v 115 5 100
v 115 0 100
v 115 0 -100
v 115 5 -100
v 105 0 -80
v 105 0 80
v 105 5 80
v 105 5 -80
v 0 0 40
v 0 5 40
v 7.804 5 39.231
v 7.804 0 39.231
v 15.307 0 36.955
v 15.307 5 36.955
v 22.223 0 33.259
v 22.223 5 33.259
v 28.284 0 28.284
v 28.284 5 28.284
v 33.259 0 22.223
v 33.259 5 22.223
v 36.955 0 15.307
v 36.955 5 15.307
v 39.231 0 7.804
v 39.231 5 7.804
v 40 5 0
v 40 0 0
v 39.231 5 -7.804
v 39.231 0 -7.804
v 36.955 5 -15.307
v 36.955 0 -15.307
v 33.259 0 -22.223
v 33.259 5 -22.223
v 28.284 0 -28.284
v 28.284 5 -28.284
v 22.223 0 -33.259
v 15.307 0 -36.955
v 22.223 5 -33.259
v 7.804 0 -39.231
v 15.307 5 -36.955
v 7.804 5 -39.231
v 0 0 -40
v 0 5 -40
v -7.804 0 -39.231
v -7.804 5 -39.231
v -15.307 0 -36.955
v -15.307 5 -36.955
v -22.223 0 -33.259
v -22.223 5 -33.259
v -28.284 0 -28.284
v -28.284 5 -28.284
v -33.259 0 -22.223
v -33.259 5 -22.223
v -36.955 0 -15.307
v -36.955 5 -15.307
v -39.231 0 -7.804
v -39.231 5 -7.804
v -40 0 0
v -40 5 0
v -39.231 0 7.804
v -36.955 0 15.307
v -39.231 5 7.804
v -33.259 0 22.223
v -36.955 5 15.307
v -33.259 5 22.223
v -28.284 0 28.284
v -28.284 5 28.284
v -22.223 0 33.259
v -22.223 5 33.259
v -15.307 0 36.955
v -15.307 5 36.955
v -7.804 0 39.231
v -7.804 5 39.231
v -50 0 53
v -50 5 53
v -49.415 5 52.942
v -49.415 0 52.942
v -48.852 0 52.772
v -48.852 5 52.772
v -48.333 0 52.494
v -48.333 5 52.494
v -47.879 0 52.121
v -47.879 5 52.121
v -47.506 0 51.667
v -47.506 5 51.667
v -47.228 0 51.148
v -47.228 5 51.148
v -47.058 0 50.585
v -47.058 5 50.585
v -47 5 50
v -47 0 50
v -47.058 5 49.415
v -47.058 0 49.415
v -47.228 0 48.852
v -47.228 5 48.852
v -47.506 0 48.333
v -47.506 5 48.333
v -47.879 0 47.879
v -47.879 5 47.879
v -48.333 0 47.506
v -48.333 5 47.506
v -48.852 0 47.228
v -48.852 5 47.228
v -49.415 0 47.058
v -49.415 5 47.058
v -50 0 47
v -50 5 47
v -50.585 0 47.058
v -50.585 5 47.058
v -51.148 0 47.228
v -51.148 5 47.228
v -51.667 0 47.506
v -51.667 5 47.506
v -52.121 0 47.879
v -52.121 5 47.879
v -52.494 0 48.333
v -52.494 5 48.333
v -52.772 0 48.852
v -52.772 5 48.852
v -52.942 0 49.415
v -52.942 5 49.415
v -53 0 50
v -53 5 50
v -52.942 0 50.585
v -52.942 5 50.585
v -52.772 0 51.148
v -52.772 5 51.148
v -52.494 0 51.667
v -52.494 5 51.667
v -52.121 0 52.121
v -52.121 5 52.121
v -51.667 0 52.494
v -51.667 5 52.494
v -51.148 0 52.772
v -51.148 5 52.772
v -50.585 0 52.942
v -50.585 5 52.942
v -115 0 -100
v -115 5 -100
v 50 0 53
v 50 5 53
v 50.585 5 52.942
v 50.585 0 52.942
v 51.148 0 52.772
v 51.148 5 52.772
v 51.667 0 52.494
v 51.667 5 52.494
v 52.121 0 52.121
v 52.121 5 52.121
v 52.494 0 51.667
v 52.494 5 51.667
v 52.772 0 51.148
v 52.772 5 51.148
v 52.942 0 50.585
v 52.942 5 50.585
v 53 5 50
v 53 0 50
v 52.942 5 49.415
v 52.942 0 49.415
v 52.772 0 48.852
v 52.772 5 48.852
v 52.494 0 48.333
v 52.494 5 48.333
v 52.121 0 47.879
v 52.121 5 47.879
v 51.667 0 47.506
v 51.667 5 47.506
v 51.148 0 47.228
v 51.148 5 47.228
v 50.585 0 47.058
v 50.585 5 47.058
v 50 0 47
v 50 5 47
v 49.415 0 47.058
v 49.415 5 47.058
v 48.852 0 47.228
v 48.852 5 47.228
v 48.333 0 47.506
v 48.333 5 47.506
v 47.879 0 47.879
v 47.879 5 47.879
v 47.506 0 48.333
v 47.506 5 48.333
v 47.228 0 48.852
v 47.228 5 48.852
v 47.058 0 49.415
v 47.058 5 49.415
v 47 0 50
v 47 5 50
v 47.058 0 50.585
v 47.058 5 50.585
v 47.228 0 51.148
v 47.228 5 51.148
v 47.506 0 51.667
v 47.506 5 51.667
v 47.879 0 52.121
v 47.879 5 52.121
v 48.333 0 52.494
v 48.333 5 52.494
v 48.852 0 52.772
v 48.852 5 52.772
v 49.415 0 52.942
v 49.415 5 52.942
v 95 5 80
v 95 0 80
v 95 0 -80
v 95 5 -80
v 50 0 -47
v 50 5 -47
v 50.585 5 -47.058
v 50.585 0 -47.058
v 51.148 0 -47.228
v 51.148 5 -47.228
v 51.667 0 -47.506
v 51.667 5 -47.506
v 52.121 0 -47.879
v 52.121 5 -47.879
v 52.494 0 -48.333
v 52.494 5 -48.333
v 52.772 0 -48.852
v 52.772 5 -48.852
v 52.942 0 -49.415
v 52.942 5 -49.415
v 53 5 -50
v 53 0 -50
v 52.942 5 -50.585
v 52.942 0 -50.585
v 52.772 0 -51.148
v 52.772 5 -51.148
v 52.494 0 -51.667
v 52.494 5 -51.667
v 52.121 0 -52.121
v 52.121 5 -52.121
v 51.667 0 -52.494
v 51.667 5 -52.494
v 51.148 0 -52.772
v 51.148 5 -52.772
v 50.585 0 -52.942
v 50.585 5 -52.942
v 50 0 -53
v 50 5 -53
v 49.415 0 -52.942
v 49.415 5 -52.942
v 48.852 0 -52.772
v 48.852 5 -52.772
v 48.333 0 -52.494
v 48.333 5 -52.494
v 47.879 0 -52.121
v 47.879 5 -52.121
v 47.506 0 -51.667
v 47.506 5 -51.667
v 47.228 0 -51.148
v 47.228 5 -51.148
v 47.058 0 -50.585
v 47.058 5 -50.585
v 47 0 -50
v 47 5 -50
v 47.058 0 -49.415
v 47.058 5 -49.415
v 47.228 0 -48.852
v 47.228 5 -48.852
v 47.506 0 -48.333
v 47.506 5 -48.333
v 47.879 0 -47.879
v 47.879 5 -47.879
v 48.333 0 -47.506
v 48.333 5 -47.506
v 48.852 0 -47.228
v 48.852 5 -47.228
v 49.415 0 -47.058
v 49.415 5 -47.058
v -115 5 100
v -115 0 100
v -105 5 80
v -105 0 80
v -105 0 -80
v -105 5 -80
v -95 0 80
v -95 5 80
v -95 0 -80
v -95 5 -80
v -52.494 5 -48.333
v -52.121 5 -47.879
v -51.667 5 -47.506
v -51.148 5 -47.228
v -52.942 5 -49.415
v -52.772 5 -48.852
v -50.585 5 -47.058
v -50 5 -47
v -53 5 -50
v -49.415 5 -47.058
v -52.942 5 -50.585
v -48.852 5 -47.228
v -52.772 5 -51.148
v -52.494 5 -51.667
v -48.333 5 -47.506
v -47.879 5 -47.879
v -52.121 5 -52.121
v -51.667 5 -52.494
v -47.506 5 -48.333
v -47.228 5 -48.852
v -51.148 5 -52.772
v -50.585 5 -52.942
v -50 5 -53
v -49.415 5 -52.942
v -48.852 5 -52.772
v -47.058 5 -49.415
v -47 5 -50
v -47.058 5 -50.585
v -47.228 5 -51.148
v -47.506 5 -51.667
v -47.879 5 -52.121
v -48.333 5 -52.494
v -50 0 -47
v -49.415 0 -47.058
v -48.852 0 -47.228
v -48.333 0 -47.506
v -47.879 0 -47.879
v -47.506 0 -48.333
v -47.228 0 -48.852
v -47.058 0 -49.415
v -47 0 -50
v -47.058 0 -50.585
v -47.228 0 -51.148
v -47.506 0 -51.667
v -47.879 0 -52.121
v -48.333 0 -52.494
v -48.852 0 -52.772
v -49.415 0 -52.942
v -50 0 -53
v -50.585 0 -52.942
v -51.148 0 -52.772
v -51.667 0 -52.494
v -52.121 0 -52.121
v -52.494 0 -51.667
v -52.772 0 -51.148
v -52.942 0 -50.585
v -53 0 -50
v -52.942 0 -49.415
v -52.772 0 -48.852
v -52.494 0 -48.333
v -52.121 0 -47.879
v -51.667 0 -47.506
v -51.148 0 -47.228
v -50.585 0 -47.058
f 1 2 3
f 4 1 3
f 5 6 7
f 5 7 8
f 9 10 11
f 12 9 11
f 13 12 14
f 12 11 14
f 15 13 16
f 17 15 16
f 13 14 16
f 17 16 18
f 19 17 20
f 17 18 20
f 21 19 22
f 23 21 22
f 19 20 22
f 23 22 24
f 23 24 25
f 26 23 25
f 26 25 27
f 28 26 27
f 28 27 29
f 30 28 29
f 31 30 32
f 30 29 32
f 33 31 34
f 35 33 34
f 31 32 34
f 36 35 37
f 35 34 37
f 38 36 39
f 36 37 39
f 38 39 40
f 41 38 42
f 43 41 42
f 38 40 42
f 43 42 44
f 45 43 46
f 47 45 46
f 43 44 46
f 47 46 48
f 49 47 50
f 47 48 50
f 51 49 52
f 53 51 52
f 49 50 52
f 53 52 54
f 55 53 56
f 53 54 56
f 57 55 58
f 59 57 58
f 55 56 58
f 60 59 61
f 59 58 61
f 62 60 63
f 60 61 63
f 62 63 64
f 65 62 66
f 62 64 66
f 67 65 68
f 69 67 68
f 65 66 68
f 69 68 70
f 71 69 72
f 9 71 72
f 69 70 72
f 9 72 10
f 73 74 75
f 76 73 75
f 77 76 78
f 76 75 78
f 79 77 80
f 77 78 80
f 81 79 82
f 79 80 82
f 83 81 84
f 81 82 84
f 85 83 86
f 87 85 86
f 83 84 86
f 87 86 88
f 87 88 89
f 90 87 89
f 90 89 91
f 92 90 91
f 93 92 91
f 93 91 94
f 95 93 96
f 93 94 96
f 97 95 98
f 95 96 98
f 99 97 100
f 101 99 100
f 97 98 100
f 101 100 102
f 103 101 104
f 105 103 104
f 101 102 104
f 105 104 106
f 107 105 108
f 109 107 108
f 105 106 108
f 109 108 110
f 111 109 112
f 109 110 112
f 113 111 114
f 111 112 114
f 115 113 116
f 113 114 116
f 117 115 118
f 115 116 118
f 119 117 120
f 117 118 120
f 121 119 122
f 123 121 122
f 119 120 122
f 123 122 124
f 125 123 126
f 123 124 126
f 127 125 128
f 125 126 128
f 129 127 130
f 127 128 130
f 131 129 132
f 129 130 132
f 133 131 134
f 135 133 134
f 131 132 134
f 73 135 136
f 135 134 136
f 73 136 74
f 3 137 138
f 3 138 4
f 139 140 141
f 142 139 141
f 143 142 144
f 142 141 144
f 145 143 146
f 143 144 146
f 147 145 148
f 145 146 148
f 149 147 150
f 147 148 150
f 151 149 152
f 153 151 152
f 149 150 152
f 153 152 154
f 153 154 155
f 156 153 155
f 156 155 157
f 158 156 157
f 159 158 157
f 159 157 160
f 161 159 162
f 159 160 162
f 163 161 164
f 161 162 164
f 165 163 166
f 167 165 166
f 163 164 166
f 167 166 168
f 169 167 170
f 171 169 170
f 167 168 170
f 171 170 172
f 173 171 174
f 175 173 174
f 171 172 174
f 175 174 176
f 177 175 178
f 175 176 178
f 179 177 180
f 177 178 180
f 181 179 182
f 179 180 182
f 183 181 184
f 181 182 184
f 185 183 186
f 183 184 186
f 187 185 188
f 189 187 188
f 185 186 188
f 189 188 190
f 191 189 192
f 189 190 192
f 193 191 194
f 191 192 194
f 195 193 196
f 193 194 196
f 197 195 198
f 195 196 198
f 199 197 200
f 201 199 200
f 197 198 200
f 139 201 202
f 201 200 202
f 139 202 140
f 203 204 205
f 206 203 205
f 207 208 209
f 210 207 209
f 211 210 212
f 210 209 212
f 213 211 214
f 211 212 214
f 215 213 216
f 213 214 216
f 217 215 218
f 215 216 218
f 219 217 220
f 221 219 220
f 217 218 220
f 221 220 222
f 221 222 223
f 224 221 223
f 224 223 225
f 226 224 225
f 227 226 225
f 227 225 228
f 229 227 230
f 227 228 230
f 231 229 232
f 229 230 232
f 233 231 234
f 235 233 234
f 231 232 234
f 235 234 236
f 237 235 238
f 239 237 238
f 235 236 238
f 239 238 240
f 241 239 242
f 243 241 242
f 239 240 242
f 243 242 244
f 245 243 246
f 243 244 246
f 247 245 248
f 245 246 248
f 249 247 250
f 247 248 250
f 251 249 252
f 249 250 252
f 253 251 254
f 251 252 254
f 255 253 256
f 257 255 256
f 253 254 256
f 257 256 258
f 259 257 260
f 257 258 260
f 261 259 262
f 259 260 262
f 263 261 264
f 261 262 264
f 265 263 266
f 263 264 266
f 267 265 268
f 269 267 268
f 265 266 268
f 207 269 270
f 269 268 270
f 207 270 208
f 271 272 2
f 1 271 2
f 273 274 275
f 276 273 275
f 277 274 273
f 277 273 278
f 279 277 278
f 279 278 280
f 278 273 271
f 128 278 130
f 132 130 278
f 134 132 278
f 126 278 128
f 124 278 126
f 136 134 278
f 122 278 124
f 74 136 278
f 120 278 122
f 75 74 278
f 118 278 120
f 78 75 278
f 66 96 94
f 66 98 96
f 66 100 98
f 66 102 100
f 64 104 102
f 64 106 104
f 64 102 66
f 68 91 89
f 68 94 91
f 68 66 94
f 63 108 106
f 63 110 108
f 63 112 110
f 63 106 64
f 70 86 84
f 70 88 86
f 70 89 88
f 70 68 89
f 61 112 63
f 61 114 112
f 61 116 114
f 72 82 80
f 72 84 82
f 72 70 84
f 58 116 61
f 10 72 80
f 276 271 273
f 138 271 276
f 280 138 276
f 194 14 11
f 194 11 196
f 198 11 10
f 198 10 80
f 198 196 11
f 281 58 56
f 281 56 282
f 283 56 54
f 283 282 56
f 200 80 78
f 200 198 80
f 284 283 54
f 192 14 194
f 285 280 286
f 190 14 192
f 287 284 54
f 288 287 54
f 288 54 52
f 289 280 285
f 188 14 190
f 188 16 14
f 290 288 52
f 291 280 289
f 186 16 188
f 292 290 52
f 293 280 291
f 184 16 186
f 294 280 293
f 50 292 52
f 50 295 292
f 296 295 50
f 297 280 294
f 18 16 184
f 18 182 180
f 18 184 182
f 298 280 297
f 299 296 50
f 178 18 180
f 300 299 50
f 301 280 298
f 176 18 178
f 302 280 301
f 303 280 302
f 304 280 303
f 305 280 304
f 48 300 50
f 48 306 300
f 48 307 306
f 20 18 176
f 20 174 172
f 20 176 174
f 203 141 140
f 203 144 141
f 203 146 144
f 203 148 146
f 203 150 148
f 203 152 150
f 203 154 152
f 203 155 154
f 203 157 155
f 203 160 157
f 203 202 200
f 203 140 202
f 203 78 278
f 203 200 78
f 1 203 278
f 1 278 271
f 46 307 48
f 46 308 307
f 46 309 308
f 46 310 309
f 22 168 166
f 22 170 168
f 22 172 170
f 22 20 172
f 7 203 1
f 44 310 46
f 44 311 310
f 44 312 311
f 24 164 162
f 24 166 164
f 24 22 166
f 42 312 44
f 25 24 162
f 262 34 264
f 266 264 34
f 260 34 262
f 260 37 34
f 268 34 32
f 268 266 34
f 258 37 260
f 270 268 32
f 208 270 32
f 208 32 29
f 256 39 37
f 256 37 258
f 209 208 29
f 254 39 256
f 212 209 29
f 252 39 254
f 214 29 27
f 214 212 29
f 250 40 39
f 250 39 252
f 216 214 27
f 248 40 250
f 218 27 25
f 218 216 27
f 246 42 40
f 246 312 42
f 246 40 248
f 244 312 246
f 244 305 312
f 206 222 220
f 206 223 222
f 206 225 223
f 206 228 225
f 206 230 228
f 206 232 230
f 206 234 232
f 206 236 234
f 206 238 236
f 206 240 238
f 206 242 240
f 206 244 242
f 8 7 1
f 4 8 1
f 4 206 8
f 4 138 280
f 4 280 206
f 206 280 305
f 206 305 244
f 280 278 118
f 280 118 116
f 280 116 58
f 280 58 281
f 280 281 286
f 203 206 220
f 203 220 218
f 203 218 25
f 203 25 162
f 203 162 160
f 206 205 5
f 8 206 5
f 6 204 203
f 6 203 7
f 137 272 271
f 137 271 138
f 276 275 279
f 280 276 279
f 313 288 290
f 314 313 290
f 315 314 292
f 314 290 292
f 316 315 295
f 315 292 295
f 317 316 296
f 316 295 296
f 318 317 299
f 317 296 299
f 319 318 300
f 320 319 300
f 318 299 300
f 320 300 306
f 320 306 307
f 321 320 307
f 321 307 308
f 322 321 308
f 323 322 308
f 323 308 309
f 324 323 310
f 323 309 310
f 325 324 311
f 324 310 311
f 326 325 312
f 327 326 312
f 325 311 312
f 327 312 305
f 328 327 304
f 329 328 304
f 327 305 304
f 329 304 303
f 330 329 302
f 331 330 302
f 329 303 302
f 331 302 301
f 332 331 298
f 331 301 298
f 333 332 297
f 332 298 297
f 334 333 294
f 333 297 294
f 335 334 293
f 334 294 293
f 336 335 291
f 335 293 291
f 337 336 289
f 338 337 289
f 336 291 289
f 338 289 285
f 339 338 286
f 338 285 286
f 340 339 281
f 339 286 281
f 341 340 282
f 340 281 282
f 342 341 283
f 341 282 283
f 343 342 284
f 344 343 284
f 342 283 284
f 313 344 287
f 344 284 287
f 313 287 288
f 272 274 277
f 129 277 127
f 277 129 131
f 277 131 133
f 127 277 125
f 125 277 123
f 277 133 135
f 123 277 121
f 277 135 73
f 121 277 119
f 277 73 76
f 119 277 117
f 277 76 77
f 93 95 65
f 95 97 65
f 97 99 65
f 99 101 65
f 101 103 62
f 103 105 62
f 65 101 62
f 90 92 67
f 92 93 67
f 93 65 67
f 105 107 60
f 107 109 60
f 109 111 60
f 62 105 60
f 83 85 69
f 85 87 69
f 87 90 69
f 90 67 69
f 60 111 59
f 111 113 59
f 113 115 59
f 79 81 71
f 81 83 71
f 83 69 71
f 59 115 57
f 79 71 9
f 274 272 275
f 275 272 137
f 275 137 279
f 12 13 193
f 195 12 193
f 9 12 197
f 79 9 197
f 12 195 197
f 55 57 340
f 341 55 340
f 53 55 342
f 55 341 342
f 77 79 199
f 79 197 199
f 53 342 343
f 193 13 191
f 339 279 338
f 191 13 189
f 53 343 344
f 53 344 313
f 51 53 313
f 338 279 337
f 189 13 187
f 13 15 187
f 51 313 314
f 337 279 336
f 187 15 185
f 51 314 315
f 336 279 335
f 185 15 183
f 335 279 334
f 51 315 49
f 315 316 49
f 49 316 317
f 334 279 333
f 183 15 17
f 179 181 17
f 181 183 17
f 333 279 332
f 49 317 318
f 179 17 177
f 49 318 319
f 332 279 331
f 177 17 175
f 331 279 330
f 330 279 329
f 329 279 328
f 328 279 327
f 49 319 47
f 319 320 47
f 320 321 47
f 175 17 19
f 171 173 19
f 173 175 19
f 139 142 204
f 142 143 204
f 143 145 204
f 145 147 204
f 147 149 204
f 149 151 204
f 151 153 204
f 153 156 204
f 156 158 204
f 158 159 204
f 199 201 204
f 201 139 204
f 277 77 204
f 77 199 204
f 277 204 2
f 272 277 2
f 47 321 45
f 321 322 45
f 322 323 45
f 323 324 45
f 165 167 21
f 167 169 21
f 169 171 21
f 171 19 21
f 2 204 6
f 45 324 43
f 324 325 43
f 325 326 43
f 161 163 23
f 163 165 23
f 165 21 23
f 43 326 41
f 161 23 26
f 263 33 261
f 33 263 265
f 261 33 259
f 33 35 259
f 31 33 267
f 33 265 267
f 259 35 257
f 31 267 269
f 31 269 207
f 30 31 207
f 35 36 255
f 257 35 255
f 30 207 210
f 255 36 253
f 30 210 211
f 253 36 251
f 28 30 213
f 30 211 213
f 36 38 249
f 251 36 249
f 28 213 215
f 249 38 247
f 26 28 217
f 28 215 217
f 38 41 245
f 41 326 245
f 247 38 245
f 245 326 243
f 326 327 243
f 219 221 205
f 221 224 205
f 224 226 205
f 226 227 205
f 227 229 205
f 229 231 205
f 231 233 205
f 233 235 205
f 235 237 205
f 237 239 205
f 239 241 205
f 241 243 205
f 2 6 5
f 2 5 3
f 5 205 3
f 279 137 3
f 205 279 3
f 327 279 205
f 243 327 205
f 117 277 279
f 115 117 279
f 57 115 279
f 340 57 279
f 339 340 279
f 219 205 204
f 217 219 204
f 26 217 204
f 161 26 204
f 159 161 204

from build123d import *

# Parameters (mm, degrees)
SKETCH1_W           = 230
SKETCH1_H           = 200
SKETCH1_W_2         = 10
SKETCH1_H_2         = 160
BOSS_EXTRUDE1_DEPTH = 5
SKETCH2_R           = 40
SKETCH2_R_2         = 3
CUT_EXTRUDE1_DEPTH  = 5


with BuildPart() as part:
    # Sketch1 → Boss-Extrude1 (new body)
    with BuildSketch(Plane(origin=(0, 0, 0), x_dir=(1, 0, 0), z_dir=(0, 1, 0))):
        Rectangle(SKETCH1_W, SKETCH1_H)
        with Locations((-100, 0)):
            Rectangle(SKETCH1_W_2, SKETCH1_H_2, mode=Mode.SUBTRACT)
        with Locations((100, 0)):
            Rectangle(SKETCH1_W_2, SKETCH1_H_2, mode=Mode.SUBTRACT)
    extrude(amount=BOSS_EXTRUDE1_DEPTH)

    # Sketch2 → Cut-Extrude1 (cut)
    with BuildSketch(Plane(origin=(0, 5, 0), x_dir=(1, 0, 0), z_dir=(0, 1, 0))):
        with Locations(Location((0, 0, 0), (0, 0, 270))):
            Circle(SKETCH2_R)
        with Locations(Location((-50, 50, 0), (0, 0, 270))):
            Circle(SKETCH2_R_2)
        with Locations(Location((50, 50, 0), (0, 0, 270))):
            Circle(SKETCH2_R_2)
        with Locations(Location((50, -50, 0), (0, 0, 270))):
            Circle(SKETCH2_R_2)
        with Locations(Location((-50, -50, 0), (0, 0, 270))):
            Circle(SKETCH2_R_2)
    extrude(amount=-CUT_EXTRUDE1_DEPTH, mode=Mode.SUBTRACT)


solid = part.part
